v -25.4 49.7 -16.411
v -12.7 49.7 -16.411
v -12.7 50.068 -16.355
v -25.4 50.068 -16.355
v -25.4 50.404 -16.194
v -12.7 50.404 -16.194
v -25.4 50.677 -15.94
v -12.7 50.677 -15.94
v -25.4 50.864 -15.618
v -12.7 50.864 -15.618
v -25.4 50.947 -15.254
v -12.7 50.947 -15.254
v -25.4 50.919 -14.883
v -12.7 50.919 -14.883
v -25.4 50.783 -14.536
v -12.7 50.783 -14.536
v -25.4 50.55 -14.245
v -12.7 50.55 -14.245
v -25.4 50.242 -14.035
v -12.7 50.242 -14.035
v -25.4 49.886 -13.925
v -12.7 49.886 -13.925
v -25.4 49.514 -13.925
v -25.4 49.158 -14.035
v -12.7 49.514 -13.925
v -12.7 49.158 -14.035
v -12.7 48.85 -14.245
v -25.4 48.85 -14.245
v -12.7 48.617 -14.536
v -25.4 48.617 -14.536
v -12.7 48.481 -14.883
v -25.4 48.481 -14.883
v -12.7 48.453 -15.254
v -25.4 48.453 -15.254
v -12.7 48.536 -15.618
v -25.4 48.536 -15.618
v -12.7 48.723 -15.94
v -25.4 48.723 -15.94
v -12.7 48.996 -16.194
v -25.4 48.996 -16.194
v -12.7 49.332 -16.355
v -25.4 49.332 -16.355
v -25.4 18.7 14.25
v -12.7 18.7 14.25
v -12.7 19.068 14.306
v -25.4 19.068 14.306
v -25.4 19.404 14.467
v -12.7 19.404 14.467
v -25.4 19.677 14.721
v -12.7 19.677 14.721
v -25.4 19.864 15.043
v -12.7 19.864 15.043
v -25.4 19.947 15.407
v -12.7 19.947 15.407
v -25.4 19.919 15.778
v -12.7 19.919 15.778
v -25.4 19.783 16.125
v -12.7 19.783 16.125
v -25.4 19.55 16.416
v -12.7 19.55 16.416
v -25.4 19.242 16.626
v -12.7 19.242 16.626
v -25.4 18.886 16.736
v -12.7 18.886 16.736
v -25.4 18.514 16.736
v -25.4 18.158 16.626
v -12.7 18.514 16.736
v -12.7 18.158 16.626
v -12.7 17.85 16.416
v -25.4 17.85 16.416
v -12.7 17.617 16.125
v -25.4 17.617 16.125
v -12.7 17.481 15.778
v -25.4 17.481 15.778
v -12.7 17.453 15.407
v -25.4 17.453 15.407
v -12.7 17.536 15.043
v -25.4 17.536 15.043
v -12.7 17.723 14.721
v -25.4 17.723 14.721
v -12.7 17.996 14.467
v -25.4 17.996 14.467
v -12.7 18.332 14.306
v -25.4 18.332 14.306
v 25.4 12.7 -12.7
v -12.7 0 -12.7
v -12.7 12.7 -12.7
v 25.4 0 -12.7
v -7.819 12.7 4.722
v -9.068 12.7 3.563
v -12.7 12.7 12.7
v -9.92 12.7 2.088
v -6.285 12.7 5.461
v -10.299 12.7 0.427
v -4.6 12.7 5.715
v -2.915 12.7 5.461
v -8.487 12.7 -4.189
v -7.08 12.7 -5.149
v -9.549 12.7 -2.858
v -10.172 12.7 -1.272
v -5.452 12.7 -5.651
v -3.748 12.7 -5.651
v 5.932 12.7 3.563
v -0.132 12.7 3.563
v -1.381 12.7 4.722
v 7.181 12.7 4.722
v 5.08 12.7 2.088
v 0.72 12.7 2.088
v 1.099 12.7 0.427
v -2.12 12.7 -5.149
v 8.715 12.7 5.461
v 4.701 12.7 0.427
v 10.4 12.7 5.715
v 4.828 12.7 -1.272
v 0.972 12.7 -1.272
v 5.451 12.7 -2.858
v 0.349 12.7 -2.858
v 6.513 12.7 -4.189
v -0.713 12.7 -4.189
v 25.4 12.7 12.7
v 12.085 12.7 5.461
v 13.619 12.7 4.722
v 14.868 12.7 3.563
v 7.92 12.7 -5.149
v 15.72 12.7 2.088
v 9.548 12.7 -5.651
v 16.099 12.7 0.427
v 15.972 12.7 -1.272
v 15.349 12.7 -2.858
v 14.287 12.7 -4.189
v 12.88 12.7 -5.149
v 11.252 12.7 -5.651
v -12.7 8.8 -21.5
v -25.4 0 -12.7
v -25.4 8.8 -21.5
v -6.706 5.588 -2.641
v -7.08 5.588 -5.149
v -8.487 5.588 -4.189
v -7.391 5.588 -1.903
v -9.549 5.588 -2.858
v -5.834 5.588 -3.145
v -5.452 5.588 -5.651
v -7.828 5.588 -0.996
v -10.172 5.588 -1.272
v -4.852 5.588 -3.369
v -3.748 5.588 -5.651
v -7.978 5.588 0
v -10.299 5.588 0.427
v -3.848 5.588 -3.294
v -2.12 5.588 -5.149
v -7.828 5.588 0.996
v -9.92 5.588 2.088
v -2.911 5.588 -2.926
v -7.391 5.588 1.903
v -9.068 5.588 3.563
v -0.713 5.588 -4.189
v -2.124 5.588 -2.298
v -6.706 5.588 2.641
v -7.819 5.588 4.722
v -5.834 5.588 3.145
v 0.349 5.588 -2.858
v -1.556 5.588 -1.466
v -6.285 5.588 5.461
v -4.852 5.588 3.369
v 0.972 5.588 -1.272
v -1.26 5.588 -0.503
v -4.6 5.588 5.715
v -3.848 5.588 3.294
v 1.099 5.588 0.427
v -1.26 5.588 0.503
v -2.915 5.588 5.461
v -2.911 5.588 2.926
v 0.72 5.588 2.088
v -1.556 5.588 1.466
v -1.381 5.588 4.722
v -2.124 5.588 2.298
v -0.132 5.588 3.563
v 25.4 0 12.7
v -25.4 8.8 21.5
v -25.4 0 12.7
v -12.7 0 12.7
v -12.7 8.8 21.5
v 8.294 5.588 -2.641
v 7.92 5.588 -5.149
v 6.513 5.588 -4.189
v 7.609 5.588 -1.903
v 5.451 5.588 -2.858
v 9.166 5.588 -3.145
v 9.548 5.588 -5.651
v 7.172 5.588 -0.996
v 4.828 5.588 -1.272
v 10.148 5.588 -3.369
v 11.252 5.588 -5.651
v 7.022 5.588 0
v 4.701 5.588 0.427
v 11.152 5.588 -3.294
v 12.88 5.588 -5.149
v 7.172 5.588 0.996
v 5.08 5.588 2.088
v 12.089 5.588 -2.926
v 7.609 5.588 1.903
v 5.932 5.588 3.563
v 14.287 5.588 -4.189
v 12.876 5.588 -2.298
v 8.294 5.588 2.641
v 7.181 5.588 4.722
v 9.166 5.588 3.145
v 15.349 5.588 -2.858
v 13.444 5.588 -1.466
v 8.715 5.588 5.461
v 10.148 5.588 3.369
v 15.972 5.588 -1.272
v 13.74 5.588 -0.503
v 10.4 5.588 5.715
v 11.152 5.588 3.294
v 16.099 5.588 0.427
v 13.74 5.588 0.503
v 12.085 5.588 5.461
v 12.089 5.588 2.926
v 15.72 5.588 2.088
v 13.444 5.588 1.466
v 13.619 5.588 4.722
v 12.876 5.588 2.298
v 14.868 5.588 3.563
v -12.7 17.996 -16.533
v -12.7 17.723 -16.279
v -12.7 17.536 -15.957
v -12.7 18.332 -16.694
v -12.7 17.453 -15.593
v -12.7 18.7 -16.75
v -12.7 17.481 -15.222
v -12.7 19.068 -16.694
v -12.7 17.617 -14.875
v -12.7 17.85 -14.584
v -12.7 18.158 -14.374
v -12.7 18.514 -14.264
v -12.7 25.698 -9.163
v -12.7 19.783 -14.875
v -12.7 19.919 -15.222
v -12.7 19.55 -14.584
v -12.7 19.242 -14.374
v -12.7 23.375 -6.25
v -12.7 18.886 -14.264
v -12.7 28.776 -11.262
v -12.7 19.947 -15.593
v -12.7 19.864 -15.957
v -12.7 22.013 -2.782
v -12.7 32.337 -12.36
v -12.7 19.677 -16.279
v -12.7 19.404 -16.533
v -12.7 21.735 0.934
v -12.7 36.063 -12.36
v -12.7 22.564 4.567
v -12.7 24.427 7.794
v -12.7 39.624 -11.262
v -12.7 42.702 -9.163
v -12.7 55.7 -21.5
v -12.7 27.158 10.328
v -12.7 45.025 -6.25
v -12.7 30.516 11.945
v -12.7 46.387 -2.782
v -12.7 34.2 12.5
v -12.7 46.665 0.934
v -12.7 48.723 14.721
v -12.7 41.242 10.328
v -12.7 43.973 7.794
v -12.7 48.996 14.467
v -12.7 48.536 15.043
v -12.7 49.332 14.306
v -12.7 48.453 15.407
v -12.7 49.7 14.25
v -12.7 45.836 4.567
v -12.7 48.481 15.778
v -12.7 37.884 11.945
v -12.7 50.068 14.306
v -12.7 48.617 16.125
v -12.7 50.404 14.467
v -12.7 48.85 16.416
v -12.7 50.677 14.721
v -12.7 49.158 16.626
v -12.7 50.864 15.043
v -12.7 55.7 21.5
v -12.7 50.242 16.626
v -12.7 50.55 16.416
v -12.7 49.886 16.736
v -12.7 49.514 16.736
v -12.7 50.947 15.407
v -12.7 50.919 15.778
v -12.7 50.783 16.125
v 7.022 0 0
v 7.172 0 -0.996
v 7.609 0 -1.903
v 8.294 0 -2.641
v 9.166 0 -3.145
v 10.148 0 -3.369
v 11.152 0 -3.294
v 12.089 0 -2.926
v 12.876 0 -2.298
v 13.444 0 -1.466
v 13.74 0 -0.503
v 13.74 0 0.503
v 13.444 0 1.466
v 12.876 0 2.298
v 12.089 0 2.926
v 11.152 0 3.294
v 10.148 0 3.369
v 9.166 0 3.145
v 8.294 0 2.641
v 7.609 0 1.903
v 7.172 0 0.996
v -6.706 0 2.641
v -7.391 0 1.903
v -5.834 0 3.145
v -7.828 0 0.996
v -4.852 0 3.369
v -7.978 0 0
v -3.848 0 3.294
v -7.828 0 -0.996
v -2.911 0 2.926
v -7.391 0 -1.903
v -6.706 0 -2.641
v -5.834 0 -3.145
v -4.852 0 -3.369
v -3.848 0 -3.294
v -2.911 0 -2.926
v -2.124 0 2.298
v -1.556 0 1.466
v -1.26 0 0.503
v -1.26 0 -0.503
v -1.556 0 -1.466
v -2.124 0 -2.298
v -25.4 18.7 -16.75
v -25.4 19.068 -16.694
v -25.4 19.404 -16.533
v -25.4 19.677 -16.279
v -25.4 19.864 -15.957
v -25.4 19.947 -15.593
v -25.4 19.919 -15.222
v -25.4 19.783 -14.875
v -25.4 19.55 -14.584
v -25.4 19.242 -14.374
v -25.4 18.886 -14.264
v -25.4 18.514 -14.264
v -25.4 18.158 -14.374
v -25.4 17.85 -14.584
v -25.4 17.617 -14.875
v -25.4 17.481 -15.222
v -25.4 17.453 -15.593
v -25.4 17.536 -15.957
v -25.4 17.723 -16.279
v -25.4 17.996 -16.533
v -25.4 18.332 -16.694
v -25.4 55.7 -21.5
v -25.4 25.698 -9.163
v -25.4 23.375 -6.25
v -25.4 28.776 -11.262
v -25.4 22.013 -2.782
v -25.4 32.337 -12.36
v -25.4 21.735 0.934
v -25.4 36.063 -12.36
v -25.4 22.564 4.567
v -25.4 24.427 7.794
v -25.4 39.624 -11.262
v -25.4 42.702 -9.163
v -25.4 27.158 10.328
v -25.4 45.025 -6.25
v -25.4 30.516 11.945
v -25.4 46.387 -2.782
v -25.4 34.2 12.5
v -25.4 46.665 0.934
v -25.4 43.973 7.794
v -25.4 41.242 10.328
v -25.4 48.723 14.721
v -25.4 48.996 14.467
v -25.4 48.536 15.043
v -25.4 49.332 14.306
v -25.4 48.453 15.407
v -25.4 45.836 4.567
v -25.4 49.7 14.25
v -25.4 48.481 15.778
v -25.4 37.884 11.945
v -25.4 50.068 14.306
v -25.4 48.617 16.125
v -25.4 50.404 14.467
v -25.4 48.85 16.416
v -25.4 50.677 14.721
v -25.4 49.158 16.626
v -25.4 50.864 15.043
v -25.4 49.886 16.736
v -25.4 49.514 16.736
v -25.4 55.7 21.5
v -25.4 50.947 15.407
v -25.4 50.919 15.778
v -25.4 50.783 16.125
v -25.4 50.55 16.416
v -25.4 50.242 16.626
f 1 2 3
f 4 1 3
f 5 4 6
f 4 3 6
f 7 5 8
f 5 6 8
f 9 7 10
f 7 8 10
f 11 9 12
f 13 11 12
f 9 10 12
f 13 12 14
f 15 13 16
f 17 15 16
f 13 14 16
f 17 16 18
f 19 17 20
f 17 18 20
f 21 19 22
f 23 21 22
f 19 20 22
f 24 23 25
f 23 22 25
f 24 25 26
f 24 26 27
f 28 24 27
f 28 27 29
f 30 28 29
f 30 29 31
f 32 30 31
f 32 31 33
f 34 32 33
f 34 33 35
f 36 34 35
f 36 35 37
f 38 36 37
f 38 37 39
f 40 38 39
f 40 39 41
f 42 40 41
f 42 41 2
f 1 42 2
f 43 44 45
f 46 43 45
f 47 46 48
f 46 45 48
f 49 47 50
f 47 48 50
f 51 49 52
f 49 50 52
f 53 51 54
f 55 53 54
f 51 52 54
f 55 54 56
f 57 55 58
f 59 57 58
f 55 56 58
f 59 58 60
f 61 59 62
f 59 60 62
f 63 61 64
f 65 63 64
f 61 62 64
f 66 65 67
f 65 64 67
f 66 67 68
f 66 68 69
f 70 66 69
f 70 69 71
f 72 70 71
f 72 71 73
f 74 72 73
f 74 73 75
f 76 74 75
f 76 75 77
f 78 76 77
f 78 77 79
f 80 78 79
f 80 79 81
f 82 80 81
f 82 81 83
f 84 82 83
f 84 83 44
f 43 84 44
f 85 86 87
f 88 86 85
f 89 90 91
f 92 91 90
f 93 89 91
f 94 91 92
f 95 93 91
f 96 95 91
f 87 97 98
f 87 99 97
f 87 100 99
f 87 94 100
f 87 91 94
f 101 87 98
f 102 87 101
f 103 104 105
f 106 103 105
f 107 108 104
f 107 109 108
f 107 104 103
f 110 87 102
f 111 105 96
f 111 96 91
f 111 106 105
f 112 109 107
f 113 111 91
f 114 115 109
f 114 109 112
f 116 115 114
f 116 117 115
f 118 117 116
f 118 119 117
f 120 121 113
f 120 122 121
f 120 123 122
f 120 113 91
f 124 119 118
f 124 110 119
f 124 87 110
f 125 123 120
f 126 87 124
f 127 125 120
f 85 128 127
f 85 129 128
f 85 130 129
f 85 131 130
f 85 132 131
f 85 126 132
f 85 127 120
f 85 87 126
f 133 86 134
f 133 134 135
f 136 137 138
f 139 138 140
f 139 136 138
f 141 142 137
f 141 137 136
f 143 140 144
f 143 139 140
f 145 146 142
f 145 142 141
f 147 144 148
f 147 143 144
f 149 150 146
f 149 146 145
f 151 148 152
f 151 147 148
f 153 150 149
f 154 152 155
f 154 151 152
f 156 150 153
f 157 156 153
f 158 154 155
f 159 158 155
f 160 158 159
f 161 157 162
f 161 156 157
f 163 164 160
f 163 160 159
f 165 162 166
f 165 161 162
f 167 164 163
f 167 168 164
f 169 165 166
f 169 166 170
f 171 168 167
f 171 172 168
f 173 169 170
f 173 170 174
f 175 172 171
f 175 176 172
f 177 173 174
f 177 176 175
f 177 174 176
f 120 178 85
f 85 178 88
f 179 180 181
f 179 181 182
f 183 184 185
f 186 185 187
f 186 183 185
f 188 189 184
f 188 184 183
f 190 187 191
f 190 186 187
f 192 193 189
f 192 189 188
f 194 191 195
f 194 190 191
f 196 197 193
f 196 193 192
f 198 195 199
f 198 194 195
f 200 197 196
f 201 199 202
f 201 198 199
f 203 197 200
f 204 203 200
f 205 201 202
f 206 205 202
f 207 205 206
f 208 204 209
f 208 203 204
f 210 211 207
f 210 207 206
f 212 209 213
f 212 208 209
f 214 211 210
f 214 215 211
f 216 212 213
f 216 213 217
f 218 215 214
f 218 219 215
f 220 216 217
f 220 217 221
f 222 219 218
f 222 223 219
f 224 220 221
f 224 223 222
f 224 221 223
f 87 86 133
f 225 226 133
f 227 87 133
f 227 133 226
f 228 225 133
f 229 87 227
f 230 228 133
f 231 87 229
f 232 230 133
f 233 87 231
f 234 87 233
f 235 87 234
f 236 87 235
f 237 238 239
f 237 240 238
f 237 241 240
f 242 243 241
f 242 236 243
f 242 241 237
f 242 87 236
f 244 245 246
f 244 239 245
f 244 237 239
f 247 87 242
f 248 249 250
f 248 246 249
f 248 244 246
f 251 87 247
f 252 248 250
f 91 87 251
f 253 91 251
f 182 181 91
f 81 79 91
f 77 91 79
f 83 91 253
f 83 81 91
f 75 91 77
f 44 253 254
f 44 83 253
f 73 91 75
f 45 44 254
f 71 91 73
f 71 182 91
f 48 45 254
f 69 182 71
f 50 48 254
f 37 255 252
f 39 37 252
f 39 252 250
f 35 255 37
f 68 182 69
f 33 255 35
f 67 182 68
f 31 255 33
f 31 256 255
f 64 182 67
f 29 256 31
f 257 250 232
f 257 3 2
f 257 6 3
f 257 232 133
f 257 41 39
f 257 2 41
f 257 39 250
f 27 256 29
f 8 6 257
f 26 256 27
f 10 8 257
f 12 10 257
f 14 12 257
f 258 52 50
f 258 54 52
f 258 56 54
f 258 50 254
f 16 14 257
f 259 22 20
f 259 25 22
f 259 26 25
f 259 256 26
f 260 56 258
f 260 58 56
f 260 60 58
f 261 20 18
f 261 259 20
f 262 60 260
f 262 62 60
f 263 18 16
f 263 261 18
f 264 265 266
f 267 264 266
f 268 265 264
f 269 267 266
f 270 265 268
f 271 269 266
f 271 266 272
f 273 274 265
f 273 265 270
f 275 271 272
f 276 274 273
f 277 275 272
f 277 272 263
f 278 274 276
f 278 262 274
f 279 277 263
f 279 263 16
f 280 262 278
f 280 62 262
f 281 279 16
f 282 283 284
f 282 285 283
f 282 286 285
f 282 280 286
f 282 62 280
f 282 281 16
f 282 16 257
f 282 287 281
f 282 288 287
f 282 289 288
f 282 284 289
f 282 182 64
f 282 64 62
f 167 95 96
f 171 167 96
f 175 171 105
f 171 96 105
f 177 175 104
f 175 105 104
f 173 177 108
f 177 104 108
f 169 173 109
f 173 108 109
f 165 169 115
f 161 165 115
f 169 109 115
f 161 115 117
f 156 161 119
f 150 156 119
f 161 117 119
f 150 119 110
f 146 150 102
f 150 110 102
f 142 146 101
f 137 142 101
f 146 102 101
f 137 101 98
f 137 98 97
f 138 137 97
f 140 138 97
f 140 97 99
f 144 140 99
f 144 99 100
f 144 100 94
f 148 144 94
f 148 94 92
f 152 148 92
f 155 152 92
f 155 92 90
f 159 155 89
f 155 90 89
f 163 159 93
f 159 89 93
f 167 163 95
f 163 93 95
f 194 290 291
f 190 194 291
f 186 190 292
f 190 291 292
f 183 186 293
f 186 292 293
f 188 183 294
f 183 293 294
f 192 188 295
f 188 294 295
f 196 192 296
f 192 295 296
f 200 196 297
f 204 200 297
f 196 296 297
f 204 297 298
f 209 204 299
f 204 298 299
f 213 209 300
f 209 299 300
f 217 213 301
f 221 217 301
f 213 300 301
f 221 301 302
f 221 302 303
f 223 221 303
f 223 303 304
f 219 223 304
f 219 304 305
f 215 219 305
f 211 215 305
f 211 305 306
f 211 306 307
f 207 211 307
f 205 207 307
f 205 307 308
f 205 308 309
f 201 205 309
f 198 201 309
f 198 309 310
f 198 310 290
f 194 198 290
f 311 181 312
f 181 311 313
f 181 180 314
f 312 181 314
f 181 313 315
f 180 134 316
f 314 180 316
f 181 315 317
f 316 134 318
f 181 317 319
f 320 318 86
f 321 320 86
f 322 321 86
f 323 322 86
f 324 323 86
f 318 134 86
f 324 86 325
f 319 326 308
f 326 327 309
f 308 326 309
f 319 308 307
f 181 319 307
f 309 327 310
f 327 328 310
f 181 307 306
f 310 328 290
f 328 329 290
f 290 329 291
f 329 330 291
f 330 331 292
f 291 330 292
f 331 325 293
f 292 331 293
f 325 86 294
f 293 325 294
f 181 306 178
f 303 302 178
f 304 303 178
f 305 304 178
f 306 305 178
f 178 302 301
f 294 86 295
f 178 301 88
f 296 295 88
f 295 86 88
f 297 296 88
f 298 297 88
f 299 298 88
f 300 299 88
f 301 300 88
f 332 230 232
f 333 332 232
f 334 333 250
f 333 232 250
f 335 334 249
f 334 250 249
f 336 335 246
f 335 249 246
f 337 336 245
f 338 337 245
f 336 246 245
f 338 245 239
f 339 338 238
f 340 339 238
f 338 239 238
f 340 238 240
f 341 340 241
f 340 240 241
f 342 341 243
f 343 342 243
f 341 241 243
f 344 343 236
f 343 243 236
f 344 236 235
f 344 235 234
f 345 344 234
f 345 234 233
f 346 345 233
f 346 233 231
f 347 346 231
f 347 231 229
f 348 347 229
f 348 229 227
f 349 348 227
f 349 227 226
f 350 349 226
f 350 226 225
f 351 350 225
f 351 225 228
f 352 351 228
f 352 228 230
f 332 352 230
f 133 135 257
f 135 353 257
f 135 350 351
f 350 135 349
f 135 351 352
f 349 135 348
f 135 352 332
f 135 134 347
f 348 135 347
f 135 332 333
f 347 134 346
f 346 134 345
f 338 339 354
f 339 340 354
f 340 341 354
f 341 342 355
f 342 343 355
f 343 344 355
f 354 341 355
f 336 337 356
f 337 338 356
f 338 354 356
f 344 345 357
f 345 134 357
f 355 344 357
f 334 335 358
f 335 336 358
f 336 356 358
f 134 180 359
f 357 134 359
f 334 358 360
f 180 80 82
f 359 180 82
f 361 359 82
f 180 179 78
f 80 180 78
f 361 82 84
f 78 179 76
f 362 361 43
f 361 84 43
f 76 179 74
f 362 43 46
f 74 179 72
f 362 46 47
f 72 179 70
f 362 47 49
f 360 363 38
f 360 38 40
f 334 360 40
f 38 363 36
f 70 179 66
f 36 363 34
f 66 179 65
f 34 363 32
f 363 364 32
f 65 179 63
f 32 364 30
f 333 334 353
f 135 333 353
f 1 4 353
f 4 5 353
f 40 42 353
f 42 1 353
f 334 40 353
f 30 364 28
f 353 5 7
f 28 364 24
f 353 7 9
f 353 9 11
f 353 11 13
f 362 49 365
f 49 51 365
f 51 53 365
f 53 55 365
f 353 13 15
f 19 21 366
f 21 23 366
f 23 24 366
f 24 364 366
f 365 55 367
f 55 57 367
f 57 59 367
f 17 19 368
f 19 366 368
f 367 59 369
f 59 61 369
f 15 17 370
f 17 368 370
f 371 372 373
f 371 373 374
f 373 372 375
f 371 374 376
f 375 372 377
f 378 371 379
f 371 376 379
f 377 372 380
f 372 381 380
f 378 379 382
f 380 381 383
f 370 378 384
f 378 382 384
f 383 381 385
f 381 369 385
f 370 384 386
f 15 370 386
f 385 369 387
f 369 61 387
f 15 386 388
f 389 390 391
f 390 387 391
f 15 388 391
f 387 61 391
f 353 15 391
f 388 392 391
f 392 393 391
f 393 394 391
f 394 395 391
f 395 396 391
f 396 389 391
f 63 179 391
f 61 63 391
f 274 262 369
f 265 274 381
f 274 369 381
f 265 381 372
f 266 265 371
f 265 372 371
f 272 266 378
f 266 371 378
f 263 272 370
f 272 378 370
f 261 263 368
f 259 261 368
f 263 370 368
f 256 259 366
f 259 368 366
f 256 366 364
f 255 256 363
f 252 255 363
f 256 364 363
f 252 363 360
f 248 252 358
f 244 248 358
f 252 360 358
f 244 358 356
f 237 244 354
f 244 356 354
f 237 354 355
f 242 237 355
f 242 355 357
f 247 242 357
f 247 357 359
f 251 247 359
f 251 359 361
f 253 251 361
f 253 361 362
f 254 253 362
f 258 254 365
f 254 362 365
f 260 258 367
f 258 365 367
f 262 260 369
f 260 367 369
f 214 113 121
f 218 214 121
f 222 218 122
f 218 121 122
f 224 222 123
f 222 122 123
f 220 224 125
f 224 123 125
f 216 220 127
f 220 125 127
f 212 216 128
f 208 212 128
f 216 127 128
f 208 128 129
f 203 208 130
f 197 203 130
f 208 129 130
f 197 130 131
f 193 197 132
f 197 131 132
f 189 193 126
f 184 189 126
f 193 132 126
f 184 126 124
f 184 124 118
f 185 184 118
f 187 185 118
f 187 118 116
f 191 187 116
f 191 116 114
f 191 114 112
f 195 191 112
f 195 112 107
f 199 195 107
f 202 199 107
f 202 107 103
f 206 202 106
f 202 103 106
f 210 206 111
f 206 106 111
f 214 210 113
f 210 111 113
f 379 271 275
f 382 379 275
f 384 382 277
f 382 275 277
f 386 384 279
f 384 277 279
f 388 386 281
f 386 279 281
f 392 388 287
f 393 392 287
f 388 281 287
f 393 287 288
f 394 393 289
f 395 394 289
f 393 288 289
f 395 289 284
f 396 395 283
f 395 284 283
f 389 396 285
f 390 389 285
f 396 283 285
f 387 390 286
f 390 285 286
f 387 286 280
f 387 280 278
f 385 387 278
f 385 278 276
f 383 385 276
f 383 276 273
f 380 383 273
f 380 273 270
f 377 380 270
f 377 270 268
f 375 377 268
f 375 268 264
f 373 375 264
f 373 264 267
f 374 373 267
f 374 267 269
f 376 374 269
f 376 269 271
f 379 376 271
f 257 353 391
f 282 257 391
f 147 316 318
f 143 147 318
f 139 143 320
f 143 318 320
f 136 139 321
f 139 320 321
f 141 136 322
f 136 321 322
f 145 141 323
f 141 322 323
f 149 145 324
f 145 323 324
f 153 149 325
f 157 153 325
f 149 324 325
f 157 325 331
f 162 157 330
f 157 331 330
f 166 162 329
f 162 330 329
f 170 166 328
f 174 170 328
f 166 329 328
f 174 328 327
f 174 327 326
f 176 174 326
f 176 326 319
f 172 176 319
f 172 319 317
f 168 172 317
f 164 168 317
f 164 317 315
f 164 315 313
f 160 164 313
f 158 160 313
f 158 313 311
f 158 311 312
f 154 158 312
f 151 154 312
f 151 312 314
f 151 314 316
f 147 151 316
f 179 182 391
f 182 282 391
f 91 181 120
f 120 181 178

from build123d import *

# Parameters (mm, degrees)
SKETCH1_W                   = 50.8
SKETCH1_H                   = 25.4
BOSS_EXTRUDE1_DEPTH         = 12.7
SKETCH2_W                   = 43
SKETCH2_H                   = 43
SKETCH2_R                   = 12.5
BOSS_EXTRUDE2_DEPTH         = 12.7
CHAMFER1_SIZE               = 12.7
TAP_DRILL_FOR_M3X0_5_TAP1_D = 2.5
F_1_4_CLEARANCE_HOLE1_D     = 6.7564
SKETCH8_R                   = 5.715
CUT_EXTRUDE1_DEPTH          = 7.112


with BuildPart() as part:
    # Sketch1 → Boss-Extrude1 (new body)
    with BuildSketch(Plane(origin=(0, 0, 0), x_dir=(1, 0, 0), z_dir=(0, 1, 0))):
        Rectangle(SKETCH1_W, SKETCH1_H)
    extrude(amount=BOSS_EXTRUDE1_DEPTH)

    # Sketch2 → Boss-Extrude2 (add)
    with BuildSketch(Plane.ZY.offset(25.4)):
        with Locations((0, 34.2)):
            Rectangle(SKETCH2_W, SKETCH2_H)
        with Locations((0, 34.2)):
            Circle(SKETCH2_R, mode=Mode.SUBTRACT)
    extrude(amount=-BOSS_EXTRUDE2_DEPTH)

    # Chamfer1
    # the kernel refuses this chamfer: 12.7 mm, written as the material it adds along each edge
    with BuildSketch(Plane(origin=(-25.4, 12.7, 12.7), x_dir=(0, -0.9996219169112966, -0.027495876610586334), z_dir=(1, 0, 0))) as chamfer1_piece_1_section:
        Polygon((CHAMFER1_SIZE * 0.999621916911, -CHAMFER1_SIZE * 0.0274958766106), (-CHAMFER1_SIZE * 0.0274958766106, -CHAMFER1_SIZE * 0.999621916911), (0, 0), align=None)
    chamfer1_piece_1 = extrude(amount=12.7, mode=Mode.PRIVATE)
    chamfer1_piece_1 = split(chamfer1_piece_1, bisect_by=Plane(origin=(-19.05, 8.16124498, 21.5), z_dir=(0, 0, -1)), keep=Keep.TOP, mode=Mode.PRIVATE)
    add(chamfer1_piece_1)
    with BuildSketch(Plane(origin=(-12.7, 12.7, -12.7), x_dir=(0, -0.9996219169112966, 0.027495876610586334), z_dir=(-1, 0, 0))) as chamfer1_piece_2_section:
        Polygon((CHAMFER1_SIZE * 0.999621916911, -CHAMFER1_SIZE * 0.0274958766106), (-CHAMFER1_SIZE * 0.0274958766106, -CHAMFER1_SIZE * 0.999621916911), (0, 0), align=None)
    chamfer1_piece_2 = extrude(amount=12.7, mode=Mode.PRIVATE)
    chamfer1_piece_2 = split(chamfer1_piece_2, bisect_by=Plane(origin=(-19.05, 8.16124498, -21.5), z_dir=(0, 0, 1)), keep=Keep.TOP, mode=Mode.PRIVATE)
    add(chamfer1_piece_2)

    # Tap Drill for M3x0.5 Tap1 (through all)
    with Locations(Plane.ZY.offset(25.4)):
        with Locations((-15.160825054, 49.7), (15.5, 49.7), (15.5, 18.7), (-15.5, 18.7)):
            Hole(TAP_DRILL_FOR_M3X0_5_TAP1_D / 2)

    # 1/4 Clearance Hole1 (through all)
    with Locations(Plane(origin=(0, 12.7, 0), x_dir=(1, 0, 0), z_dir=(0, 1, 0))):
        with Locations((-4.6, 0), (10.4, 0)):
            Hole(F_1_4_CLEARANCE_HOLE1_D / 2)

    # Sketch8 → Cut-Extrude1 (cut)
    with BuildSketch(Plane(origin=(0, 12.7, 0), x_dir=(1, 0, 0), z_dir=(0, 1, 0))):
        with Locations(Location((-4.6, 0, 0), (0, 0, 270))):
            Circle(SKETCH8_R)
        with Locations(Location((10.4, 0, 0), (0, 0, 270))):
            Circle(SKETCH8_R)
    extrude(amount=-CUT_EXTRUDE1_DEPTH, mode=Mode.SUBTRACT)


solid = part.part
